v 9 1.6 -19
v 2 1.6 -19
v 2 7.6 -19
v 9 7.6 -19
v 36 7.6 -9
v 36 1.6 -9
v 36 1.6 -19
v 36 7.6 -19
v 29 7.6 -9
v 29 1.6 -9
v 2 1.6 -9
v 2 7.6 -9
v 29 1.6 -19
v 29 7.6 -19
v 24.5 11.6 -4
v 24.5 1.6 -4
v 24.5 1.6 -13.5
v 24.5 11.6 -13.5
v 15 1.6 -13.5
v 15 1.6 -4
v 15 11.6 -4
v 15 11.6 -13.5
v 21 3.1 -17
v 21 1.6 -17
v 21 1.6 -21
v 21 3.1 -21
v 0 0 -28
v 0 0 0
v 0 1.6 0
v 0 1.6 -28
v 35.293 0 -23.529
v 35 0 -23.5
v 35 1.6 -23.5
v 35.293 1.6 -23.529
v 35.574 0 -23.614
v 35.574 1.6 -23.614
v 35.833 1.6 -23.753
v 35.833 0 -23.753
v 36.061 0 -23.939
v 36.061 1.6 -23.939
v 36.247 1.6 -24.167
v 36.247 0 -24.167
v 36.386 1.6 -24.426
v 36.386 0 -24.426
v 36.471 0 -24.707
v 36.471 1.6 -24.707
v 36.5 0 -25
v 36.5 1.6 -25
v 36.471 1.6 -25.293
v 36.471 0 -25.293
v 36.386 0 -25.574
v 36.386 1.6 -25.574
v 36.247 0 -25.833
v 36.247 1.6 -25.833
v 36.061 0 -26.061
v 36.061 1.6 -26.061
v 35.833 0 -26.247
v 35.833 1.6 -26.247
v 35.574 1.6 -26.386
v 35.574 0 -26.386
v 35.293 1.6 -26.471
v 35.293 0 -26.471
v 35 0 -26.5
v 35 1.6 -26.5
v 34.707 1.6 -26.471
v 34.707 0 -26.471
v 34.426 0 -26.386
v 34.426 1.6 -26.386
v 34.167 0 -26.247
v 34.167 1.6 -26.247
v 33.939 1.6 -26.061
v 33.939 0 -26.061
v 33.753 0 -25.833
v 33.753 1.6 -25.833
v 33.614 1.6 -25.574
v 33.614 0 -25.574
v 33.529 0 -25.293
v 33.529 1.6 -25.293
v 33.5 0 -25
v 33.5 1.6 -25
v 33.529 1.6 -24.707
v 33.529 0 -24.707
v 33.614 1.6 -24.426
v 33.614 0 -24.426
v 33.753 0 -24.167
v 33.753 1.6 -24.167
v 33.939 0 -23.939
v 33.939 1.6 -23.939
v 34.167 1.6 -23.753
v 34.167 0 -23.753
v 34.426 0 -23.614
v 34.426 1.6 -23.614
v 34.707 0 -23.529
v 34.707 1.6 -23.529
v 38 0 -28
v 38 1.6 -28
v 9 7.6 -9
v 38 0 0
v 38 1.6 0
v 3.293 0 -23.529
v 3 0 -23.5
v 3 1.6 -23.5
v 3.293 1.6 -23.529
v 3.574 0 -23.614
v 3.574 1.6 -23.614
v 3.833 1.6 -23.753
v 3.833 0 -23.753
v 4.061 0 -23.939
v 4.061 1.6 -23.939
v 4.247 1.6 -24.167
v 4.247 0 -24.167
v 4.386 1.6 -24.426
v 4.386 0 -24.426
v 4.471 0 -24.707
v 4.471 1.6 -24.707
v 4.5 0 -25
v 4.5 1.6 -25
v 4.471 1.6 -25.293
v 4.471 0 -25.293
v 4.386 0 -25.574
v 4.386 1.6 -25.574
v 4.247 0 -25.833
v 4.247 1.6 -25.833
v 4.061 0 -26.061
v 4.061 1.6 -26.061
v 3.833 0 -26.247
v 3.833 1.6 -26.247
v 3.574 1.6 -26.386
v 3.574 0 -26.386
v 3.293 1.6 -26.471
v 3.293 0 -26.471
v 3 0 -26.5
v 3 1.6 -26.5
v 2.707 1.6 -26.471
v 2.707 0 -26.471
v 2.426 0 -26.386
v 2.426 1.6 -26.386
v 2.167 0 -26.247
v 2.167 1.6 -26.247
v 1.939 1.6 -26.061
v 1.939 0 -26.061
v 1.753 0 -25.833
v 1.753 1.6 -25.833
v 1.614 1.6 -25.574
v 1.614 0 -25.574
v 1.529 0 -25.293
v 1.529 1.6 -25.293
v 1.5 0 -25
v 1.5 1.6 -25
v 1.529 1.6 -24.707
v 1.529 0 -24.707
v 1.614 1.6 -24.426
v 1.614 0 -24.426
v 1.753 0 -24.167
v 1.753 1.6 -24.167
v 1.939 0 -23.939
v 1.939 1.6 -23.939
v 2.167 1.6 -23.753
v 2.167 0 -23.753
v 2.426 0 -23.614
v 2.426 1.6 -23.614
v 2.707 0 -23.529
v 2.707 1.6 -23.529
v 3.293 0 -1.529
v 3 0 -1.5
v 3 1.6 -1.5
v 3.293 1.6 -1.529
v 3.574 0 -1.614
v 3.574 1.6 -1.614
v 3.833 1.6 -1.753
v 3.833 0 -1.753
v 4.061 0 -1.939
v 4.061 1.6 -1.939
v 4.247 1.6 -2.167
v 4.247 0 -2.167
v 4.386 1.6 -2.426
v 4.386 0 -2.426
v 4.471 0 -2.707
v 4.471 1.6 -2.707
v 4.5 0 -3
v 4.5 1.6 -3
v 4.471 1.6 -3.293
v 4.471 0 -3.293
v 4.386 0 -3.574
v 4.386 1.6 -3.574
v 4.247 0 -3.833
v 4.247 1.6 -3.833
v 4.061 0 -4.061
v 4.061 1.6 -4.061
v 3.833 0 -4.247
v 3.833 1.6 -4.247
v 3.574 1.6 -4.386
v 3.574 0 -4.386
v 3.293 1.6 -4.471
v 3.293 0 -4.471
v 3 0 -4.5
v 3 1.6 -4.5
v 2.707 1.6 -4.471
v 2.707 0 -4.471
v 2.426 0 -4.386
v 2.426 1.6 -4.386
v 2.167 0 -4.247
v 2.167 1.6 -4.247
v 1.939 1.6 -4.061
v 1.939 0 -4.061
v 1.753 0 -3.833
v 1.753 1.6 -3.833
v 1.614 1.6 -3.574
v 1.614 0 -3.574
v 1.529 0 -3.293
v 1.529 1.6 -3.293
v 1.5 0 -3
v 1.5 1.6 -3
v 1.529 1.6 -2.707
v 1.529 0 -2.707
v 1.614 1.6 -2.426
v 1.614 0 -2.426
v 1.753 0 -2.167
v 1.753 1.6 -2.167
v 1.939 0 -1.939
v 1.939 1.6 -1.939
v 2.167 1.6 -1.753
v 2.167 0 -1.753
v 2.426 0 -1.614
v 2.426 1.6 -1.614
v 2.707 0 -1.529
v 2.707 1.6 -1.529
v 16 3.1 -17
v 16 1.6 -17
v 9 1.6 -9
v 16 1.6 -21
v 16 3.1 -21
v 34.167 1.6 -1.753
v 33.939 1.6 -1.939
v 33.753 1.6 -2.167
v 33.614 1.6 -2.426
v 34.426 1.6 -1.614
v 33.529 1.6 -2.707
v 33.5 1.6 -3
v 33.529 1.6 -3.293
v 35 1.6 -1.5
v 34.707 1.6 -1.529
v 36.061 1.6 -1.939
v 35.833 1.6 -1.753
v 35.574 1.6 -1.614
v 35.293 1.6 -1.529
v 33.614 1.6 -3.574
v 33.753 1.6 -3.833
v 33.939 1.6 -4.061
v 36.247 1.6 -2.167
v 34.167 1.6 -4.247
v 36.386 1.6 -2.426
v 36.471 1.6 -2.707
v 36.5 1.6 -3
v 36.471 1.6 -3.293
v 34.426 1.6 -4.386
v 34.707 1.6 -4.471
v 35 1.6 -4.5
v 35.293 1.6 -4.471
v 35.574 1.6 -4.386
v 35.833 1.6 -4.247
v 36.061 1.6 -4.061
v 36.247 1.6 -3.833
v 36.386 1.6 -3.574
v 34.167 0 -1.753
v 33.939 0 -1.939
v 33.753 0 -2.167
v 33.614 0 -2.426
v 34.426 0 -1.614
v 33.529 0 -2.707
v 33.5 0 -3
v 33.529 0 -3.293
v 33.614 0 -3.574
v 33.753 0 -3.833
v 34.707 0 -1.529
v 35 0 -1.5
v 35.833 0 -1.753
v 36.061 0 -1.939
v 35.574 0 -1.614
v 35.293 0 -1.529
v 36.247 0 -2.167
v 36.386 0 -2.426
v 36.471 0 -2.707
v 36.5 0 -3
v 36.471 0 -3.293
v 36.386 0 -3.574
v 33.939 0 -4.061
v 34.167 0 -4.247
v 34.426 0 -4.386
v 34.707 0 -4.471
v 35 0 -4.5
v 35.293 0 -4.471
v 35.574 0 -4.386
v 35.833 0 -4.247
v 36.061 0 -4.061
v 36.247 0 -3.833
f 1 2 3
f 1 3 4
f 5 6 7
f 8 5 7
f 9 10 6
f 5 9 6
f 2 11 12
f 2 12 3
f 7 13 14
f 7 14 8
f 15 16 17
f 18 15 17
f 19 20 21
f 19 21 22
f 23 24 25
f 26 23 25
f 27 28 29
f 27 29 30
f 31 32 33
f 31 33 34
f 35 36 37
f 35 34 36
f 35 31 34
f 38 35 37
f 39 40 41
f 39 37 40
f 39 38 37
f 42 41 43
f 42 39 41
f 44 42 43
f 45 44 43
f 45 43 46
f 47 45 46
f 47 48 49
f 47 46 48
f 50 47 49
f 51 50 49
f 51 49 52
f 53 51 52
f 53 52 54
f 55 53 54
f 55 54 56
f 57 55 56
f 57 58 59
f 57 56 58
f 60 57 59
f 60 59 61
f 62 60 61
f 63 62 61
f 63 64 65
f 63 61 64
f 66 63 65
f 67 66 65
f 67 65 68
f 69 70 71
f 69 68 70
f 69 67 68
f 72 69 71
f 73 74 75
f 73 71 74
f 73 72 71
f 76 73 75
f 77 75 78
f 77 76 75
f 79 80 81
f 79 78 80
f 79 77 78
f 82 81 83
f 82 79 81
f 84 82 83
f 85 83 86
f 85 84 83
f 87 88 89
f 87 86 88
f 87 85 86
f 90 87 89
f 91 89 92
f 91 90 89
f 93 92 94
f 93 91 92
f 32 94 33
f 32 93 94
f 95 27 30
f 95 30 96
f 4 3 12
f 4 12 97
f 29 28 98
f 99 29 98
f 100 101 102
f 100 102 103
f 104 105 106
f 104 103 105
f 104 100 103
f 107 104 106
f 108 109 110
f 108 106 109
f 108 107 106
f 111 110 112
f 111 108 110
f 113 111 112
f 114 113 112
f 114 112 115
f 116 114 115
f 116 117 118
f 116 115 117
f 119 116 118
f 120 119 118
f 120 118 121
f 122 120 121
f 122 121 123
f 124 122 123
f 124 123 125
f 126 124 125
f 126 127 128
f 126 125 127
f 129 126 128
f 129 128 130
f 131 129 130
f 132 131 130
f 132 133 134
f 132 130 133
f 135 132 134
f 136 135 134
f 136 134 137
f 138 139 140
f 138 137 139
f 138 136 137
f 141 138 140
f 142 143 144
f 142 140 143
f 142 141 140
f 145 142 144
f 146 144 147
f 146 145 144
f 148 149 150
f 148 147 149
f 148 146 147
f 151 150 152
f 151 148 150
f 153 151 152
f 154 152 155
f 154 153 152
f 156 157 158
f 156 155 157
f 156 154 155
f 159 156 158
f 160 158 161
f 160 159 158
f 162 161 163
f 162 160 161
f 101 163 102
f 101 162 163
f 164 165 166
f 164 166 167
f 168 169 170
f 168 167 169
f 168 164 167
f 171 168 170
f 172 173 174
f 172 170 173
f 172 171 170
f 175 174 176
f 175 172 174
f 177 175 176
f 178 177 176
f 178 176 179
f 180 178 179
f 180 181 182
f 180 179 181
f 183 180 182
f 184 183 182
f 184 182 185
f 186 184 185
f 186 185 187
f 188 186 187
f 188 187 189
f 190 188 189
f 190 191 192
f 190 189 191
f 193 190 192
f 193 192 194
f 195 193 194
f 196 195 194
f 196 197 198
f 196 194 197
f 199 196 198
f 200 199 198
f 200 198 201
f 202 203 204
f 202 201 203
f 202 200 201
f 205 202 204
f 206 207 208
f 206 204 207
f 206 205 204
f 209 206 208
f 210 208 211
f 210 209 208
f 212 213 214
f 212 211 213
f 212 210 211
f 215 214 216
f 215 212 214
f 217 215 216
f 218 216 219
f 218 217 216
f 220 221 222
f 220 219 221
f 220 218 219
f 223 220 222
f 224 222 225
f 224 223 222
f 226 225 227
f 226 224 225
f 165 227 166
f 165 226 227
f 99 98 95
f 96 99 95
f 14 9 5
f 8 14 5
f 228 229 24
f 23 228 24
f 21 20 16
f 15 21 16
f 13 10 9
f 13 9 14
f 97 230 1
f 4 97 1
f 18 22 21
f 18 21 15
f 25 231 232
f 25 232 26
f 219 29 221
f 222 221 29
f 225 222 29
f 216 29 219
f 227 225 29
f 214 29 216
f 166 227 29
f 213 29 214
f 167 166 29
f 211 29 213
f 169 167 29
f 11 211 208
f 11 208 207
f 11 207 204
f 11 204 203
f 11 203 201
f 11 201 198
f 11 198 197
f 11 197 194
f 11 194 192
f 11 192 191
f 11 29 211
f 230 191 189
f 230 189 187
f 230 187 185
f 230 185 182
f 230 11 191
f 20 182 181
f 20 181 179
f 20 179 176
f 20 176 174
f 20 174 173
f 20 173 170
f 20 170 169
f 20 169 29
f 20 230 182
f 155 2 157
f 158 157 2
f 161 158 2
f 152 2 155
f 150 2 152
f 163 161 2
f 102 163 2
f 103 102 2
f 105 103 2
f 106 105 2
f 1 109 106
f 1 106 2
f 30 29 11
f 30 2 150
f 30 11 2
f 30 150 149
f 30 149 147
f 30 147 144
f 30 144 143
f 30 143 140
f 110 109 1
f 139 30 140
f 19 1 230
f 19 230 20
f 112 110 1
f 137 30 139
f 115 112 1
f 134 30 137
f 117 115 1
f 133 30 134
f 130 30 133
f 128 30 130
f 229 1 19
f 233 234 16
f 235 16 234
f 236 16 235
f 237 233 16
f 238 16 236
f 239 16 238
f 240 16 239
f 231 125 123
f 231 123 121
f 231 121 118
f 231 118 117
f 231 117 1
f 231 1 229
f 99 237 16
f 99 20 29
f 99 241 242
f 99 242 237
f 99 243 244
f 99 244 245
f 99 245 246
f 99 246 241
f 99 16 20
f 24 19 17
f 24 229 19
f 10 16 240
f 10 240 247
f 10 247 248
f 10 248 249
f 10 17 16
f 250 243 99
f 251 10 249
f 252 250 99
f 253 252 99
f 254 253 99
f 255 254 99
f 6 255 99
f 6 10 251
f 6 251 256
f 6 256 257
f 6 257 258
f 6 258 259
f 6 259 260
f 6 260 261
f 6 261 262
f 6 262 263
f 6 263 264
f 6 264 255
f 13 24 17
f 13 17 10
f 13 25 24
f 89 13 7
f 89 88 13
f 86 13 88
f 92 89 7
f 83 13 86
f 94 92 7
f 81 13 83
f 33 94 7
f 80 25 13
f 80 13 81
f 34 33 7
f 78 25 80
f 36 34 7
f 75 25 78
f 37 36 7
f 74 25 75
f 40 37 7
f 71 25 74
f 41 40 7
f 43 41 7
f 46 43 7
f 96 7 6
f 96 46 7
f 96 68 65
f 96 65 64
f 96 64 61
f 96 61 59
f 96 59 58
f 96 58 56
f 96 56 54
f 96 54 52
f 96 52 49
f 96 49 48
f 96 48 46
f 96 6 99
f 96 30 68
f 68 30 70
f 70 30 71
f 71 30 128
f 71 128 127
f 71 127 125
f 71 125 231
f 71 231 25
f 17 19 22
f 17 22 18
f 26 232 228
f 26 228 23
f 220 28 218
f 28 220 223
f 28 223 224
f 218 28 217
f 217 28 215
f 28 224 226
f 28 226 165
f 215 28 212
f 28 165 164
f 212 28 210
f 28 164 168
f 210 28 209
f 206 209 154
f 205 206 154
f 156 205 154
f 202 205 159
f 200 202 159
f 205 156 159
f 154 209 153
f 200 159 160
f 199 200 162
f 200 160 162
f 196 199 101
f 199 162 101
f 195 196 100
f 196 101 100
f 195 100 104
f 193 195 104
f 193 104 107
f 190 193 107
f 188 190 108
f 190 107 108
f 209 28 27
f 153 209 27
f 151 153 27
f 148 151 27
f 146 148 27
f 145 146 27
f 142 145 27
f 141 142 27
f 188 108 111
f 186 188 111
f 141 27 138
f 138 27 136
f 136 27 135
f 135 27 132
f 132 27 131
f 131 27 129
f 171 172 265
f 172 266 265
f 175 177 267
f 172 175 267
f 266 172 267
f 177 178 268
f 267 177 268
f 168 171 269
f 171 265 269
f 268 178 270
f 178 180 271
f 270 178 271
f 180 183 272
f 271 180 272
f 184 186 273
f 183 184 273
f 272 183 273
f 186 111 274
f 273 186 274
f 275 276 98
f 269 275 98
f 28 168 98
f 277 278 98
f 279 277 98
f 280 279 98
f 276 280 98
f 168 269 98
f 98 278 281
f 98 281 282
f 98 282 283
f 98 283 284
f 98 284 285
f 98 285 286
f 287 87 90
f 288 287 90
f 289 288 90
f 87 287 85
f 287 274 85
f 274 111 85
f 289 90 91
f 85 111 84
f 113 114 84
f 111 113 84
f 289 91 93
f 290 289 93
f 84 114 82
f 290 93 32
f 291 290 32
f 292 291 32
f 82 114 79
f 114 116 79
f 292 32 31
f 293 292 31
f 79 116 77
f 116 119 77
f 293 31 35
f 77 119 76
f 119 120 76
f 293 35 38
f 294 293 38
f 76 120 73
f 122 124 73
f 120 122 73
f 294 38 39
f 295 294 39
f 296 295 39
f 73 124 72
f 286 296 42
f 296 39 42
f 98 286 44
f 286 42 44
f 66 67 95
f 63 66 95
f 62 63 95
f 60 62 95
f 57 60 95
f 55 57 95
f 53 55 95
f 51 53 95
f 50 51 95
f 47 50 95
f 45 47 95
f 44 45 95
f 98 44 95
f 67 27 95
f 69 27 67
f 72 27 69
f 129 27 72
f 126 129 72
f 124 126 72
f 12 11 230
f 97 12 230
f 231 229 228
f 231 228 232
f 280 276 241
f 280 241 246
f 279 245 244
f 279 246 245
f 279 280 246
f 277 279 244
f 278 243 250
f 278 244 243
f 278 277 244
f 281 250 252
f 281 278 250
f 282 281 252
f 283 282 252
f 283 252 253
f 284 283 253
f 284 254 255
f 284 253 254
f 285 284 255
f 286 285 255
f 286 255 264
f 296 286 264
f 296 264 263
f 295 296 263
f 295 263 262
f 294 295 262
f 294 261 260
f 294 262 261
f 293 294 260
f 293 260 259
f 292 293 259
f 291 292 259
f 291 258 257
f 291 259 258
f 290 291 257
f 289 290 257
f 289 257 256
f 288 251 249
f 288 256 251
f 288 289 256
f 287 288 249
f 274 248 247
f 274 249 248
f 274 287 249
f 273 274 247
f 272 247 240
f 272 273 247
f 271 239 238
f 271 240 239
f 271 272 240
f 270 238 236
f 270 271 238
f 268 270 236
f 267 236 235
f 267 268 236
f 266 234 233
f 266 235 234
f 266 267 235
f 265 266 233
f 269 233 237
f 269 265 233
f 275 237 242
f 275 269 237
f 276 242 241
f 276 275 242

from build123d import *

# Parameters (mm, degrees)
SKETCH1_W               = 38
SKETCH1_H               = 28
PCB_DEPTH               = 1.6
MOUNT_HOLE_1_DEPTH      = 48.22880477
MOUNT_HOLE_1_DEPTH_BACK = 48.22880477
SKETCH2_R               = 1.5
MOUNT_HOLE_2_DEPTH      = 48.22880477
MOUNT_HOLE_2_DEPTH_BACK = 48.22880477
SKETCH3_R               = 1.5
MOUNT_HOLE_3_DEPTH      = 48.22880477
MOUNT_HOLE_3_DEPTH_BACK = 48.22880477
SKETCH4_R               = 1.5
MOUNT_HOLE_4_DEPTH      = 48.22880477
MOUNT_HOLE_4_DEPTH_BACK = 48.22880477
SKETCH5_R               = 1.5
SENSOR_CONNECTOR_START  = 1.6
SKETCH6_W               = 7
SKETCH6_H               = 10
SENSOR_CONNECTOR_DEPTH  = 6
SIGNAL_CONNECTOR_START  = 1.6
SKETCH7_W               = 7
SKETCH7_H               = 10
SIGNAL_CONNECTOR_DEPTH  = 6
THRESHOLD_POT_START     = 1.6
SKETCH8_W               = 9.5
SKETCH8_H               = 9.5
THRESHOLD_POT_DEPTH     = 10
COMPARATOR_START        = 1.6
SKETCH9_W               = 5
SKETCH9_H               = 4
COMPARATOR_DEPTH        = 1.5


with BuildPart() as part:
    # Sketch1 → PCB (new body)
    with BuildSketch(Plane(origin=(0, 0, 0), x_dir=(1, 0, 0), z_dir=(0, 1, 0))):
        with Locations((19, 14)):
            Rectangle(SKETCH1_W, SKETCH1_H)
    extrude(amount=PCB_DEPTH)

    # Sketch2 → Mount_hole_1 (cut, two sides: drawn at the far end of the back side and taken through both)
    with BuildSketch(Plane(origin=(0, 0, 0), x_dir=(1, 0, 0), z_dir=(0, 1, 0)).offset(-MOUNT_HOLE_1_DEPTH_BACK)):
        with Locations(Location((3, 3, 0), (0, 0, 270))):
            Circle(SKETCH2_R)
    extrude(amount=MOUNT_HOLE_1_DEPTH + MOUNT_HOLE_1_DEPTH_BACK, mode=Mode.SUBTRACT)

    # Sketch3 → Mount_hole_2 (cut, two sides: drawn at the far end of the back side and taken through both)
    with BuildSketch(Plane(origin=(0, 0, 0), x_dir=(1, 0, 0), z_dir=(0, 1, 0)).offset(-MOUNT_HOLE_2_DEPTH_BACK)):
        with Locations(Location((35, 3, 0), (0, 0, 270))):
            Circle(SKETCH3_R)
    extrude(amount=MOUNT_HOLE_2_DEPTH + MOUNT_HOLE_2_DEPTH_BACK, mode=Mode.SUBTRACT)

    # Sketch4 → Mount_hole_3 (cut, two sides: drawn at the far end of the back side and taken through both)
    with BuildSketch(Plane(origin=(0, 0, 0), x_dir=(1, 0, 0), z_dir=(0, 1, 0)).offset(-MOUNT_HOLE_3_DEPTH_BACK)):
        with Locations(Location((3, 25, 0), (0, 0, 270))):
            Circle(SKETCH4_R)
    extrude(amount=MOUNT_HOLE_3_DEPTH + MOUNT_HOLE_3_DEPTH_BACK, mode=Mode.SUBTRACT)

    # Sketch5 → Mount_hole_4 (cut, two sides: drawn at the far end of the back side and taken through both)
    with BuildSketch(Plane(origin=(0, 0, 0), x_dir=(1, 0, 0), z_dir=(0, 1, 0)).offset(-MOUNT_HOLE_4_DEPTH_BACK)):
        with Locations(Location((35, 25, 0), (0, 0, 270))):
            Circle(SKETCH5_R)
    extrude(amount=MOUNT_HOLE_4_DEPTH + MOUNT_HOLE_4_DEPTH_BACK, mode=Mode.SUBTRACT)

    # Sketch6 → Sensor_connector (add)
    with BuildSketch(Plane(origin=(0, 0, 0), x_dir=(1, 0, 0), z_dir=(0, 1, 0)).offset(SENSOR_CONNECTOR_START)):
        with Locations((5.5, 14)):
            Rectangle(SKETCH6_W, SKETCH6_H)
    extrude(amount=SENSOR_CONNECTOR_DEPTH)

    # Sketch7 → Signal_connector (add)
    with BuildSketch(Plane(origin=(0, 0, 0), x_dir=(1, 0, 0), z_dir=(0, 1, 0)).offset(SIGNAL_CONNECTOR_START)):
        with Locations((32.5, 14)):
            Rectangle(SKETCH7_W, SKETCH7_H)
    extrude(amount=SIGNAL_CONNECTOR_DEPTH)

    # Sketch8 → Threshold_pot (add)
    with BuildSketch(Plane(origin=(0, 0, 0), x_dir=(1, 0, 0), z_dir=(0, 1, 0)).offset(THRESHOLD_POT_START)):
        with Locations((19.75, 8.75)):
            Rectangle(SKETCH8_W, SKETCH8_H)
    extrude(amount=THRESHOLD_POT_DEPTH)

    # Sketch9 → Comparator (add)
    with BuildSketch(Plane(origin=(0, 0, 0), x_dir=(1, 0, 0), z_dir=(0, 1, 0)).offset(COMPARATOR_START)):
        with Locations((18.5, 19)):
            Rectangle(SKETCH9_W, SKETCH9_H)
    extrude(amount=COMPARATOR_DEPTH)


solid = part.part
